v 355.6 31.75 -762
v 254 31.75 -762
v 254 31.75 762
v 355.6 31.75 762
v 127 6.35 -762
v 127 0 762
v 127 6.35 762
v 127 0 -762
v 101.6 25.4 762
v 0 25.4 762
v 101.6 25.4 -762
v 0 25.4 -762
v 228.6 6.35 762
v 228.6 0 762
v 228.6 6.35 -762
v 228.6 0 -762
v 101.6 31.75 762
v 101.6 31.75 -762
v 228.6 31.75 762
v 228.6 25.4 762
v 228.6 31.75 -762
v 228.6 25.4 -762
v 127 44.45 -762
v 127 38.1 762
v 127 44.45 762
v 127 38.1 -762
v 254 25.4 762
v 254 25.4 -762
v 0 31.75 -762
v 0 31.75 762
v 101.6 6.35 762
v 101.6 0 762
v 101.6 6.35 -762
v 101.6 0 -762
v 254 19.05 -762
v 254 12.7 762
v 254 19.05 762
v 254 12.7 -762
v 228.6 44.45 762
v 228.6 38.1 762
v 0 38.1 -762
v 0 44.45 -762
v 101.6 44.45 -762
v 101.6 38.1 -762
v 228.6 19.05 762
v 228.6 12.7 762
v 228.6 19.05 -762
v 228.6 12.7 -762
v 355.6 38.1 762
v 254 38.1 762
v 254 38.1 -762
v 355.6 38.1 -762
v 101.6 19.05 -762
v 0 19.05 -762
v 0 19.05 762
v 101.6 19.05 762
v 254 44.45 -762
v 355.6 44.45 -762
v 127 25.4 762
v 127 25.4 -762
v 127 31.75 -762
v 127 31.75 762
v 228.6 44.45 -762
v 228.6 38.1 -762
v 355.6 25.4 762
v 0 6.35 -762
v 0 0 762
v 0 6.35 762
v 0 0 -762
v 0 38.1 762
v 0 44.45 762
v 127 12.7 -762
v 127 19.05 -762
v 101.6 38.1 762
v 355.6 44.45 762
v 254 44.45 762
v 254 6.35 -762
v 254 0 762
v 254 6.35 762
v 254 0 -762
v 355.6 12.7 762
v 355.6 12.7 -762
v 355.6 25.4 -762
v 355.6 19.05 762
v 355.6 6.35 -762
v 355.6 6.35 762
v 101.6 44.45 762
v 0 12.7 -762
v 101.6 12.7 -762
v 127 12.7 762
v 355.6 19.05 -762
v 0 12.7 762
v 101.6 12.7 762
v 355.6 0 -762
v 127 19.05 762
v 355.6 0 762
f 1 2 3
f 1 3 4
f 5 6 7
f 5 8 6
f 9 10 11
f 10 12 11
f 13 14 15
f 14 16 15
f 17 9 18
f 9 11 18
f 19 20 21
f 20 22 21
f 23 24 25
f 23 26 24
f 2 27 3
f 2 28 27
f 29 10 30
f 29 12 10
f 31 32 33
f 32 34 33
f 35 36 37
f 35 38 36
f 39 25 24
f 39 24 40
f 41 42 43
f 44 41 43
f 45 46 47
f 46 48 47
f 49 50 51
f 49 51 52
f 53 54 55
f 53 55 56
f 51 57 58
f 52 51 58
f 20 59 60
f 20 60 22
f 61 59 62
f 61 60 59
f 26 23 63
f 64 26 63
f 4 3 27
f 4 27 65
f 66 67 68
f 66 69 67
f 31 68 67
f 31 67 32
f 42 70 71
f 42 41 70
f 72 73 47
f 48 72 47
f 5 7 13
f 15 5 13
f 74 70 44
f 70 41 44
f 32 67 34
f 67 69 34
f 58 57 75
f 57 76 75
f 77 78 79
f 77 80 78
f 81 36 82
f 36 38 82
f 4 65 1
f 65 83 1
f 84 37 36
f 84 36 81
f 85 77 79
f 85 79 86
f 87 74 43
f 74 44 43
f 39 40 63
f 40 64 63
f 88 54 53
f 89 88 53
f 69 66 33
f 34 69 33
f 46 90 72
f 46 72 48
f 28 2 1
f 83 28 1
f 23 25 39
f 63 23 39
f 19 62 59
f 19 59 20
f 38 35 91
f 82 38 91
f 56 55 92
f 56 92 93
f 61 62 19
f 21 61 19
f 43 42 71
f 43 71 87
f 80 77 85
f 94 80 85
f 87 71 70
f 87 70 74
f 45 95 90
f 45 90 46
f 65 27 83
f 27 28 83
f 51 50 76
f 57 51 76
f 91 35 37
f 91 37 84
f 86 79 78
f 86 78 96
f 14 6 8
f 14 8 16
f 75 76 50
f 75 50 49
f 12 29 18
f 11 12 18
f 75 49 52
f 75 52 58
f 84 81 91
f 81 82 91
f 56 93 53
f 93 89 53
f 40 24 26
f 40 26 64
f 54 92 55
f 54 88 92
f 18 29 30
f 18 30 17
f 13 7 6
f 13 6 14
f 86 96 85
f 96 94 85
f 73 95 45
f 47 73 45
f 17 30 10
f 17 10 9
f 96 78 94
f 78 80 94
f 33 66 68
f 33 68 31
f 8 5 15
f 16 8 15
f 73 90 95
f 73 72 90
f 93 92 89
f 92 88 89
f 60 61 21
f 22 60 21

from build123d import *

# Parameters (mm, degrees)
F0_W     = 101.6
F0_H     = 6.35
F1_DEPTH = 762


with BuildPart() as f1:
    # F0 (on Top) → F1 (new body, symmetric)
    with BuildSketch(Plane.XY):
        with Locations((50.8, 3.175)):
            Rectangle(F0_W, F0_H)
        with Locations((50.8, 15.875)):
            Rectangle(F0_W, F0_H)
        with Locations((50.8, 28.575)):
            Rectangle(F0_W, F0_H)
        with Locations((50.8, 41.275)):
            Rectangle(F0_W, F0_H)
        with Locations((177.8, 3.175)):
            Rectangle(F0_W, F0_H)
        with Locations((177.8, 15.875)):
            Rectangle(F0_W, F0_H)
        with Locations((177.8, 28.575)):
            Rectangle(F0_W, F0_H)
        with Locations((177.8, 41.275)):
            Rectangle(F0_W, F0_H)
        with Locations((304.8, 3.175)):
            Rectangle(F0_W, F0_H)
        with Locations((304.8, 15.875)):
            Rectangle(F0_W, F0_H)
        with Locations((304.8, 28.575)):
            Rectangle(F0_W, F0_H)
        with Locations((304.8, 41.275)):
            Rectangle(F0_W, F0_H)
    extrude(amount=F1_DEPTH, both=True)


solid = f1.part
